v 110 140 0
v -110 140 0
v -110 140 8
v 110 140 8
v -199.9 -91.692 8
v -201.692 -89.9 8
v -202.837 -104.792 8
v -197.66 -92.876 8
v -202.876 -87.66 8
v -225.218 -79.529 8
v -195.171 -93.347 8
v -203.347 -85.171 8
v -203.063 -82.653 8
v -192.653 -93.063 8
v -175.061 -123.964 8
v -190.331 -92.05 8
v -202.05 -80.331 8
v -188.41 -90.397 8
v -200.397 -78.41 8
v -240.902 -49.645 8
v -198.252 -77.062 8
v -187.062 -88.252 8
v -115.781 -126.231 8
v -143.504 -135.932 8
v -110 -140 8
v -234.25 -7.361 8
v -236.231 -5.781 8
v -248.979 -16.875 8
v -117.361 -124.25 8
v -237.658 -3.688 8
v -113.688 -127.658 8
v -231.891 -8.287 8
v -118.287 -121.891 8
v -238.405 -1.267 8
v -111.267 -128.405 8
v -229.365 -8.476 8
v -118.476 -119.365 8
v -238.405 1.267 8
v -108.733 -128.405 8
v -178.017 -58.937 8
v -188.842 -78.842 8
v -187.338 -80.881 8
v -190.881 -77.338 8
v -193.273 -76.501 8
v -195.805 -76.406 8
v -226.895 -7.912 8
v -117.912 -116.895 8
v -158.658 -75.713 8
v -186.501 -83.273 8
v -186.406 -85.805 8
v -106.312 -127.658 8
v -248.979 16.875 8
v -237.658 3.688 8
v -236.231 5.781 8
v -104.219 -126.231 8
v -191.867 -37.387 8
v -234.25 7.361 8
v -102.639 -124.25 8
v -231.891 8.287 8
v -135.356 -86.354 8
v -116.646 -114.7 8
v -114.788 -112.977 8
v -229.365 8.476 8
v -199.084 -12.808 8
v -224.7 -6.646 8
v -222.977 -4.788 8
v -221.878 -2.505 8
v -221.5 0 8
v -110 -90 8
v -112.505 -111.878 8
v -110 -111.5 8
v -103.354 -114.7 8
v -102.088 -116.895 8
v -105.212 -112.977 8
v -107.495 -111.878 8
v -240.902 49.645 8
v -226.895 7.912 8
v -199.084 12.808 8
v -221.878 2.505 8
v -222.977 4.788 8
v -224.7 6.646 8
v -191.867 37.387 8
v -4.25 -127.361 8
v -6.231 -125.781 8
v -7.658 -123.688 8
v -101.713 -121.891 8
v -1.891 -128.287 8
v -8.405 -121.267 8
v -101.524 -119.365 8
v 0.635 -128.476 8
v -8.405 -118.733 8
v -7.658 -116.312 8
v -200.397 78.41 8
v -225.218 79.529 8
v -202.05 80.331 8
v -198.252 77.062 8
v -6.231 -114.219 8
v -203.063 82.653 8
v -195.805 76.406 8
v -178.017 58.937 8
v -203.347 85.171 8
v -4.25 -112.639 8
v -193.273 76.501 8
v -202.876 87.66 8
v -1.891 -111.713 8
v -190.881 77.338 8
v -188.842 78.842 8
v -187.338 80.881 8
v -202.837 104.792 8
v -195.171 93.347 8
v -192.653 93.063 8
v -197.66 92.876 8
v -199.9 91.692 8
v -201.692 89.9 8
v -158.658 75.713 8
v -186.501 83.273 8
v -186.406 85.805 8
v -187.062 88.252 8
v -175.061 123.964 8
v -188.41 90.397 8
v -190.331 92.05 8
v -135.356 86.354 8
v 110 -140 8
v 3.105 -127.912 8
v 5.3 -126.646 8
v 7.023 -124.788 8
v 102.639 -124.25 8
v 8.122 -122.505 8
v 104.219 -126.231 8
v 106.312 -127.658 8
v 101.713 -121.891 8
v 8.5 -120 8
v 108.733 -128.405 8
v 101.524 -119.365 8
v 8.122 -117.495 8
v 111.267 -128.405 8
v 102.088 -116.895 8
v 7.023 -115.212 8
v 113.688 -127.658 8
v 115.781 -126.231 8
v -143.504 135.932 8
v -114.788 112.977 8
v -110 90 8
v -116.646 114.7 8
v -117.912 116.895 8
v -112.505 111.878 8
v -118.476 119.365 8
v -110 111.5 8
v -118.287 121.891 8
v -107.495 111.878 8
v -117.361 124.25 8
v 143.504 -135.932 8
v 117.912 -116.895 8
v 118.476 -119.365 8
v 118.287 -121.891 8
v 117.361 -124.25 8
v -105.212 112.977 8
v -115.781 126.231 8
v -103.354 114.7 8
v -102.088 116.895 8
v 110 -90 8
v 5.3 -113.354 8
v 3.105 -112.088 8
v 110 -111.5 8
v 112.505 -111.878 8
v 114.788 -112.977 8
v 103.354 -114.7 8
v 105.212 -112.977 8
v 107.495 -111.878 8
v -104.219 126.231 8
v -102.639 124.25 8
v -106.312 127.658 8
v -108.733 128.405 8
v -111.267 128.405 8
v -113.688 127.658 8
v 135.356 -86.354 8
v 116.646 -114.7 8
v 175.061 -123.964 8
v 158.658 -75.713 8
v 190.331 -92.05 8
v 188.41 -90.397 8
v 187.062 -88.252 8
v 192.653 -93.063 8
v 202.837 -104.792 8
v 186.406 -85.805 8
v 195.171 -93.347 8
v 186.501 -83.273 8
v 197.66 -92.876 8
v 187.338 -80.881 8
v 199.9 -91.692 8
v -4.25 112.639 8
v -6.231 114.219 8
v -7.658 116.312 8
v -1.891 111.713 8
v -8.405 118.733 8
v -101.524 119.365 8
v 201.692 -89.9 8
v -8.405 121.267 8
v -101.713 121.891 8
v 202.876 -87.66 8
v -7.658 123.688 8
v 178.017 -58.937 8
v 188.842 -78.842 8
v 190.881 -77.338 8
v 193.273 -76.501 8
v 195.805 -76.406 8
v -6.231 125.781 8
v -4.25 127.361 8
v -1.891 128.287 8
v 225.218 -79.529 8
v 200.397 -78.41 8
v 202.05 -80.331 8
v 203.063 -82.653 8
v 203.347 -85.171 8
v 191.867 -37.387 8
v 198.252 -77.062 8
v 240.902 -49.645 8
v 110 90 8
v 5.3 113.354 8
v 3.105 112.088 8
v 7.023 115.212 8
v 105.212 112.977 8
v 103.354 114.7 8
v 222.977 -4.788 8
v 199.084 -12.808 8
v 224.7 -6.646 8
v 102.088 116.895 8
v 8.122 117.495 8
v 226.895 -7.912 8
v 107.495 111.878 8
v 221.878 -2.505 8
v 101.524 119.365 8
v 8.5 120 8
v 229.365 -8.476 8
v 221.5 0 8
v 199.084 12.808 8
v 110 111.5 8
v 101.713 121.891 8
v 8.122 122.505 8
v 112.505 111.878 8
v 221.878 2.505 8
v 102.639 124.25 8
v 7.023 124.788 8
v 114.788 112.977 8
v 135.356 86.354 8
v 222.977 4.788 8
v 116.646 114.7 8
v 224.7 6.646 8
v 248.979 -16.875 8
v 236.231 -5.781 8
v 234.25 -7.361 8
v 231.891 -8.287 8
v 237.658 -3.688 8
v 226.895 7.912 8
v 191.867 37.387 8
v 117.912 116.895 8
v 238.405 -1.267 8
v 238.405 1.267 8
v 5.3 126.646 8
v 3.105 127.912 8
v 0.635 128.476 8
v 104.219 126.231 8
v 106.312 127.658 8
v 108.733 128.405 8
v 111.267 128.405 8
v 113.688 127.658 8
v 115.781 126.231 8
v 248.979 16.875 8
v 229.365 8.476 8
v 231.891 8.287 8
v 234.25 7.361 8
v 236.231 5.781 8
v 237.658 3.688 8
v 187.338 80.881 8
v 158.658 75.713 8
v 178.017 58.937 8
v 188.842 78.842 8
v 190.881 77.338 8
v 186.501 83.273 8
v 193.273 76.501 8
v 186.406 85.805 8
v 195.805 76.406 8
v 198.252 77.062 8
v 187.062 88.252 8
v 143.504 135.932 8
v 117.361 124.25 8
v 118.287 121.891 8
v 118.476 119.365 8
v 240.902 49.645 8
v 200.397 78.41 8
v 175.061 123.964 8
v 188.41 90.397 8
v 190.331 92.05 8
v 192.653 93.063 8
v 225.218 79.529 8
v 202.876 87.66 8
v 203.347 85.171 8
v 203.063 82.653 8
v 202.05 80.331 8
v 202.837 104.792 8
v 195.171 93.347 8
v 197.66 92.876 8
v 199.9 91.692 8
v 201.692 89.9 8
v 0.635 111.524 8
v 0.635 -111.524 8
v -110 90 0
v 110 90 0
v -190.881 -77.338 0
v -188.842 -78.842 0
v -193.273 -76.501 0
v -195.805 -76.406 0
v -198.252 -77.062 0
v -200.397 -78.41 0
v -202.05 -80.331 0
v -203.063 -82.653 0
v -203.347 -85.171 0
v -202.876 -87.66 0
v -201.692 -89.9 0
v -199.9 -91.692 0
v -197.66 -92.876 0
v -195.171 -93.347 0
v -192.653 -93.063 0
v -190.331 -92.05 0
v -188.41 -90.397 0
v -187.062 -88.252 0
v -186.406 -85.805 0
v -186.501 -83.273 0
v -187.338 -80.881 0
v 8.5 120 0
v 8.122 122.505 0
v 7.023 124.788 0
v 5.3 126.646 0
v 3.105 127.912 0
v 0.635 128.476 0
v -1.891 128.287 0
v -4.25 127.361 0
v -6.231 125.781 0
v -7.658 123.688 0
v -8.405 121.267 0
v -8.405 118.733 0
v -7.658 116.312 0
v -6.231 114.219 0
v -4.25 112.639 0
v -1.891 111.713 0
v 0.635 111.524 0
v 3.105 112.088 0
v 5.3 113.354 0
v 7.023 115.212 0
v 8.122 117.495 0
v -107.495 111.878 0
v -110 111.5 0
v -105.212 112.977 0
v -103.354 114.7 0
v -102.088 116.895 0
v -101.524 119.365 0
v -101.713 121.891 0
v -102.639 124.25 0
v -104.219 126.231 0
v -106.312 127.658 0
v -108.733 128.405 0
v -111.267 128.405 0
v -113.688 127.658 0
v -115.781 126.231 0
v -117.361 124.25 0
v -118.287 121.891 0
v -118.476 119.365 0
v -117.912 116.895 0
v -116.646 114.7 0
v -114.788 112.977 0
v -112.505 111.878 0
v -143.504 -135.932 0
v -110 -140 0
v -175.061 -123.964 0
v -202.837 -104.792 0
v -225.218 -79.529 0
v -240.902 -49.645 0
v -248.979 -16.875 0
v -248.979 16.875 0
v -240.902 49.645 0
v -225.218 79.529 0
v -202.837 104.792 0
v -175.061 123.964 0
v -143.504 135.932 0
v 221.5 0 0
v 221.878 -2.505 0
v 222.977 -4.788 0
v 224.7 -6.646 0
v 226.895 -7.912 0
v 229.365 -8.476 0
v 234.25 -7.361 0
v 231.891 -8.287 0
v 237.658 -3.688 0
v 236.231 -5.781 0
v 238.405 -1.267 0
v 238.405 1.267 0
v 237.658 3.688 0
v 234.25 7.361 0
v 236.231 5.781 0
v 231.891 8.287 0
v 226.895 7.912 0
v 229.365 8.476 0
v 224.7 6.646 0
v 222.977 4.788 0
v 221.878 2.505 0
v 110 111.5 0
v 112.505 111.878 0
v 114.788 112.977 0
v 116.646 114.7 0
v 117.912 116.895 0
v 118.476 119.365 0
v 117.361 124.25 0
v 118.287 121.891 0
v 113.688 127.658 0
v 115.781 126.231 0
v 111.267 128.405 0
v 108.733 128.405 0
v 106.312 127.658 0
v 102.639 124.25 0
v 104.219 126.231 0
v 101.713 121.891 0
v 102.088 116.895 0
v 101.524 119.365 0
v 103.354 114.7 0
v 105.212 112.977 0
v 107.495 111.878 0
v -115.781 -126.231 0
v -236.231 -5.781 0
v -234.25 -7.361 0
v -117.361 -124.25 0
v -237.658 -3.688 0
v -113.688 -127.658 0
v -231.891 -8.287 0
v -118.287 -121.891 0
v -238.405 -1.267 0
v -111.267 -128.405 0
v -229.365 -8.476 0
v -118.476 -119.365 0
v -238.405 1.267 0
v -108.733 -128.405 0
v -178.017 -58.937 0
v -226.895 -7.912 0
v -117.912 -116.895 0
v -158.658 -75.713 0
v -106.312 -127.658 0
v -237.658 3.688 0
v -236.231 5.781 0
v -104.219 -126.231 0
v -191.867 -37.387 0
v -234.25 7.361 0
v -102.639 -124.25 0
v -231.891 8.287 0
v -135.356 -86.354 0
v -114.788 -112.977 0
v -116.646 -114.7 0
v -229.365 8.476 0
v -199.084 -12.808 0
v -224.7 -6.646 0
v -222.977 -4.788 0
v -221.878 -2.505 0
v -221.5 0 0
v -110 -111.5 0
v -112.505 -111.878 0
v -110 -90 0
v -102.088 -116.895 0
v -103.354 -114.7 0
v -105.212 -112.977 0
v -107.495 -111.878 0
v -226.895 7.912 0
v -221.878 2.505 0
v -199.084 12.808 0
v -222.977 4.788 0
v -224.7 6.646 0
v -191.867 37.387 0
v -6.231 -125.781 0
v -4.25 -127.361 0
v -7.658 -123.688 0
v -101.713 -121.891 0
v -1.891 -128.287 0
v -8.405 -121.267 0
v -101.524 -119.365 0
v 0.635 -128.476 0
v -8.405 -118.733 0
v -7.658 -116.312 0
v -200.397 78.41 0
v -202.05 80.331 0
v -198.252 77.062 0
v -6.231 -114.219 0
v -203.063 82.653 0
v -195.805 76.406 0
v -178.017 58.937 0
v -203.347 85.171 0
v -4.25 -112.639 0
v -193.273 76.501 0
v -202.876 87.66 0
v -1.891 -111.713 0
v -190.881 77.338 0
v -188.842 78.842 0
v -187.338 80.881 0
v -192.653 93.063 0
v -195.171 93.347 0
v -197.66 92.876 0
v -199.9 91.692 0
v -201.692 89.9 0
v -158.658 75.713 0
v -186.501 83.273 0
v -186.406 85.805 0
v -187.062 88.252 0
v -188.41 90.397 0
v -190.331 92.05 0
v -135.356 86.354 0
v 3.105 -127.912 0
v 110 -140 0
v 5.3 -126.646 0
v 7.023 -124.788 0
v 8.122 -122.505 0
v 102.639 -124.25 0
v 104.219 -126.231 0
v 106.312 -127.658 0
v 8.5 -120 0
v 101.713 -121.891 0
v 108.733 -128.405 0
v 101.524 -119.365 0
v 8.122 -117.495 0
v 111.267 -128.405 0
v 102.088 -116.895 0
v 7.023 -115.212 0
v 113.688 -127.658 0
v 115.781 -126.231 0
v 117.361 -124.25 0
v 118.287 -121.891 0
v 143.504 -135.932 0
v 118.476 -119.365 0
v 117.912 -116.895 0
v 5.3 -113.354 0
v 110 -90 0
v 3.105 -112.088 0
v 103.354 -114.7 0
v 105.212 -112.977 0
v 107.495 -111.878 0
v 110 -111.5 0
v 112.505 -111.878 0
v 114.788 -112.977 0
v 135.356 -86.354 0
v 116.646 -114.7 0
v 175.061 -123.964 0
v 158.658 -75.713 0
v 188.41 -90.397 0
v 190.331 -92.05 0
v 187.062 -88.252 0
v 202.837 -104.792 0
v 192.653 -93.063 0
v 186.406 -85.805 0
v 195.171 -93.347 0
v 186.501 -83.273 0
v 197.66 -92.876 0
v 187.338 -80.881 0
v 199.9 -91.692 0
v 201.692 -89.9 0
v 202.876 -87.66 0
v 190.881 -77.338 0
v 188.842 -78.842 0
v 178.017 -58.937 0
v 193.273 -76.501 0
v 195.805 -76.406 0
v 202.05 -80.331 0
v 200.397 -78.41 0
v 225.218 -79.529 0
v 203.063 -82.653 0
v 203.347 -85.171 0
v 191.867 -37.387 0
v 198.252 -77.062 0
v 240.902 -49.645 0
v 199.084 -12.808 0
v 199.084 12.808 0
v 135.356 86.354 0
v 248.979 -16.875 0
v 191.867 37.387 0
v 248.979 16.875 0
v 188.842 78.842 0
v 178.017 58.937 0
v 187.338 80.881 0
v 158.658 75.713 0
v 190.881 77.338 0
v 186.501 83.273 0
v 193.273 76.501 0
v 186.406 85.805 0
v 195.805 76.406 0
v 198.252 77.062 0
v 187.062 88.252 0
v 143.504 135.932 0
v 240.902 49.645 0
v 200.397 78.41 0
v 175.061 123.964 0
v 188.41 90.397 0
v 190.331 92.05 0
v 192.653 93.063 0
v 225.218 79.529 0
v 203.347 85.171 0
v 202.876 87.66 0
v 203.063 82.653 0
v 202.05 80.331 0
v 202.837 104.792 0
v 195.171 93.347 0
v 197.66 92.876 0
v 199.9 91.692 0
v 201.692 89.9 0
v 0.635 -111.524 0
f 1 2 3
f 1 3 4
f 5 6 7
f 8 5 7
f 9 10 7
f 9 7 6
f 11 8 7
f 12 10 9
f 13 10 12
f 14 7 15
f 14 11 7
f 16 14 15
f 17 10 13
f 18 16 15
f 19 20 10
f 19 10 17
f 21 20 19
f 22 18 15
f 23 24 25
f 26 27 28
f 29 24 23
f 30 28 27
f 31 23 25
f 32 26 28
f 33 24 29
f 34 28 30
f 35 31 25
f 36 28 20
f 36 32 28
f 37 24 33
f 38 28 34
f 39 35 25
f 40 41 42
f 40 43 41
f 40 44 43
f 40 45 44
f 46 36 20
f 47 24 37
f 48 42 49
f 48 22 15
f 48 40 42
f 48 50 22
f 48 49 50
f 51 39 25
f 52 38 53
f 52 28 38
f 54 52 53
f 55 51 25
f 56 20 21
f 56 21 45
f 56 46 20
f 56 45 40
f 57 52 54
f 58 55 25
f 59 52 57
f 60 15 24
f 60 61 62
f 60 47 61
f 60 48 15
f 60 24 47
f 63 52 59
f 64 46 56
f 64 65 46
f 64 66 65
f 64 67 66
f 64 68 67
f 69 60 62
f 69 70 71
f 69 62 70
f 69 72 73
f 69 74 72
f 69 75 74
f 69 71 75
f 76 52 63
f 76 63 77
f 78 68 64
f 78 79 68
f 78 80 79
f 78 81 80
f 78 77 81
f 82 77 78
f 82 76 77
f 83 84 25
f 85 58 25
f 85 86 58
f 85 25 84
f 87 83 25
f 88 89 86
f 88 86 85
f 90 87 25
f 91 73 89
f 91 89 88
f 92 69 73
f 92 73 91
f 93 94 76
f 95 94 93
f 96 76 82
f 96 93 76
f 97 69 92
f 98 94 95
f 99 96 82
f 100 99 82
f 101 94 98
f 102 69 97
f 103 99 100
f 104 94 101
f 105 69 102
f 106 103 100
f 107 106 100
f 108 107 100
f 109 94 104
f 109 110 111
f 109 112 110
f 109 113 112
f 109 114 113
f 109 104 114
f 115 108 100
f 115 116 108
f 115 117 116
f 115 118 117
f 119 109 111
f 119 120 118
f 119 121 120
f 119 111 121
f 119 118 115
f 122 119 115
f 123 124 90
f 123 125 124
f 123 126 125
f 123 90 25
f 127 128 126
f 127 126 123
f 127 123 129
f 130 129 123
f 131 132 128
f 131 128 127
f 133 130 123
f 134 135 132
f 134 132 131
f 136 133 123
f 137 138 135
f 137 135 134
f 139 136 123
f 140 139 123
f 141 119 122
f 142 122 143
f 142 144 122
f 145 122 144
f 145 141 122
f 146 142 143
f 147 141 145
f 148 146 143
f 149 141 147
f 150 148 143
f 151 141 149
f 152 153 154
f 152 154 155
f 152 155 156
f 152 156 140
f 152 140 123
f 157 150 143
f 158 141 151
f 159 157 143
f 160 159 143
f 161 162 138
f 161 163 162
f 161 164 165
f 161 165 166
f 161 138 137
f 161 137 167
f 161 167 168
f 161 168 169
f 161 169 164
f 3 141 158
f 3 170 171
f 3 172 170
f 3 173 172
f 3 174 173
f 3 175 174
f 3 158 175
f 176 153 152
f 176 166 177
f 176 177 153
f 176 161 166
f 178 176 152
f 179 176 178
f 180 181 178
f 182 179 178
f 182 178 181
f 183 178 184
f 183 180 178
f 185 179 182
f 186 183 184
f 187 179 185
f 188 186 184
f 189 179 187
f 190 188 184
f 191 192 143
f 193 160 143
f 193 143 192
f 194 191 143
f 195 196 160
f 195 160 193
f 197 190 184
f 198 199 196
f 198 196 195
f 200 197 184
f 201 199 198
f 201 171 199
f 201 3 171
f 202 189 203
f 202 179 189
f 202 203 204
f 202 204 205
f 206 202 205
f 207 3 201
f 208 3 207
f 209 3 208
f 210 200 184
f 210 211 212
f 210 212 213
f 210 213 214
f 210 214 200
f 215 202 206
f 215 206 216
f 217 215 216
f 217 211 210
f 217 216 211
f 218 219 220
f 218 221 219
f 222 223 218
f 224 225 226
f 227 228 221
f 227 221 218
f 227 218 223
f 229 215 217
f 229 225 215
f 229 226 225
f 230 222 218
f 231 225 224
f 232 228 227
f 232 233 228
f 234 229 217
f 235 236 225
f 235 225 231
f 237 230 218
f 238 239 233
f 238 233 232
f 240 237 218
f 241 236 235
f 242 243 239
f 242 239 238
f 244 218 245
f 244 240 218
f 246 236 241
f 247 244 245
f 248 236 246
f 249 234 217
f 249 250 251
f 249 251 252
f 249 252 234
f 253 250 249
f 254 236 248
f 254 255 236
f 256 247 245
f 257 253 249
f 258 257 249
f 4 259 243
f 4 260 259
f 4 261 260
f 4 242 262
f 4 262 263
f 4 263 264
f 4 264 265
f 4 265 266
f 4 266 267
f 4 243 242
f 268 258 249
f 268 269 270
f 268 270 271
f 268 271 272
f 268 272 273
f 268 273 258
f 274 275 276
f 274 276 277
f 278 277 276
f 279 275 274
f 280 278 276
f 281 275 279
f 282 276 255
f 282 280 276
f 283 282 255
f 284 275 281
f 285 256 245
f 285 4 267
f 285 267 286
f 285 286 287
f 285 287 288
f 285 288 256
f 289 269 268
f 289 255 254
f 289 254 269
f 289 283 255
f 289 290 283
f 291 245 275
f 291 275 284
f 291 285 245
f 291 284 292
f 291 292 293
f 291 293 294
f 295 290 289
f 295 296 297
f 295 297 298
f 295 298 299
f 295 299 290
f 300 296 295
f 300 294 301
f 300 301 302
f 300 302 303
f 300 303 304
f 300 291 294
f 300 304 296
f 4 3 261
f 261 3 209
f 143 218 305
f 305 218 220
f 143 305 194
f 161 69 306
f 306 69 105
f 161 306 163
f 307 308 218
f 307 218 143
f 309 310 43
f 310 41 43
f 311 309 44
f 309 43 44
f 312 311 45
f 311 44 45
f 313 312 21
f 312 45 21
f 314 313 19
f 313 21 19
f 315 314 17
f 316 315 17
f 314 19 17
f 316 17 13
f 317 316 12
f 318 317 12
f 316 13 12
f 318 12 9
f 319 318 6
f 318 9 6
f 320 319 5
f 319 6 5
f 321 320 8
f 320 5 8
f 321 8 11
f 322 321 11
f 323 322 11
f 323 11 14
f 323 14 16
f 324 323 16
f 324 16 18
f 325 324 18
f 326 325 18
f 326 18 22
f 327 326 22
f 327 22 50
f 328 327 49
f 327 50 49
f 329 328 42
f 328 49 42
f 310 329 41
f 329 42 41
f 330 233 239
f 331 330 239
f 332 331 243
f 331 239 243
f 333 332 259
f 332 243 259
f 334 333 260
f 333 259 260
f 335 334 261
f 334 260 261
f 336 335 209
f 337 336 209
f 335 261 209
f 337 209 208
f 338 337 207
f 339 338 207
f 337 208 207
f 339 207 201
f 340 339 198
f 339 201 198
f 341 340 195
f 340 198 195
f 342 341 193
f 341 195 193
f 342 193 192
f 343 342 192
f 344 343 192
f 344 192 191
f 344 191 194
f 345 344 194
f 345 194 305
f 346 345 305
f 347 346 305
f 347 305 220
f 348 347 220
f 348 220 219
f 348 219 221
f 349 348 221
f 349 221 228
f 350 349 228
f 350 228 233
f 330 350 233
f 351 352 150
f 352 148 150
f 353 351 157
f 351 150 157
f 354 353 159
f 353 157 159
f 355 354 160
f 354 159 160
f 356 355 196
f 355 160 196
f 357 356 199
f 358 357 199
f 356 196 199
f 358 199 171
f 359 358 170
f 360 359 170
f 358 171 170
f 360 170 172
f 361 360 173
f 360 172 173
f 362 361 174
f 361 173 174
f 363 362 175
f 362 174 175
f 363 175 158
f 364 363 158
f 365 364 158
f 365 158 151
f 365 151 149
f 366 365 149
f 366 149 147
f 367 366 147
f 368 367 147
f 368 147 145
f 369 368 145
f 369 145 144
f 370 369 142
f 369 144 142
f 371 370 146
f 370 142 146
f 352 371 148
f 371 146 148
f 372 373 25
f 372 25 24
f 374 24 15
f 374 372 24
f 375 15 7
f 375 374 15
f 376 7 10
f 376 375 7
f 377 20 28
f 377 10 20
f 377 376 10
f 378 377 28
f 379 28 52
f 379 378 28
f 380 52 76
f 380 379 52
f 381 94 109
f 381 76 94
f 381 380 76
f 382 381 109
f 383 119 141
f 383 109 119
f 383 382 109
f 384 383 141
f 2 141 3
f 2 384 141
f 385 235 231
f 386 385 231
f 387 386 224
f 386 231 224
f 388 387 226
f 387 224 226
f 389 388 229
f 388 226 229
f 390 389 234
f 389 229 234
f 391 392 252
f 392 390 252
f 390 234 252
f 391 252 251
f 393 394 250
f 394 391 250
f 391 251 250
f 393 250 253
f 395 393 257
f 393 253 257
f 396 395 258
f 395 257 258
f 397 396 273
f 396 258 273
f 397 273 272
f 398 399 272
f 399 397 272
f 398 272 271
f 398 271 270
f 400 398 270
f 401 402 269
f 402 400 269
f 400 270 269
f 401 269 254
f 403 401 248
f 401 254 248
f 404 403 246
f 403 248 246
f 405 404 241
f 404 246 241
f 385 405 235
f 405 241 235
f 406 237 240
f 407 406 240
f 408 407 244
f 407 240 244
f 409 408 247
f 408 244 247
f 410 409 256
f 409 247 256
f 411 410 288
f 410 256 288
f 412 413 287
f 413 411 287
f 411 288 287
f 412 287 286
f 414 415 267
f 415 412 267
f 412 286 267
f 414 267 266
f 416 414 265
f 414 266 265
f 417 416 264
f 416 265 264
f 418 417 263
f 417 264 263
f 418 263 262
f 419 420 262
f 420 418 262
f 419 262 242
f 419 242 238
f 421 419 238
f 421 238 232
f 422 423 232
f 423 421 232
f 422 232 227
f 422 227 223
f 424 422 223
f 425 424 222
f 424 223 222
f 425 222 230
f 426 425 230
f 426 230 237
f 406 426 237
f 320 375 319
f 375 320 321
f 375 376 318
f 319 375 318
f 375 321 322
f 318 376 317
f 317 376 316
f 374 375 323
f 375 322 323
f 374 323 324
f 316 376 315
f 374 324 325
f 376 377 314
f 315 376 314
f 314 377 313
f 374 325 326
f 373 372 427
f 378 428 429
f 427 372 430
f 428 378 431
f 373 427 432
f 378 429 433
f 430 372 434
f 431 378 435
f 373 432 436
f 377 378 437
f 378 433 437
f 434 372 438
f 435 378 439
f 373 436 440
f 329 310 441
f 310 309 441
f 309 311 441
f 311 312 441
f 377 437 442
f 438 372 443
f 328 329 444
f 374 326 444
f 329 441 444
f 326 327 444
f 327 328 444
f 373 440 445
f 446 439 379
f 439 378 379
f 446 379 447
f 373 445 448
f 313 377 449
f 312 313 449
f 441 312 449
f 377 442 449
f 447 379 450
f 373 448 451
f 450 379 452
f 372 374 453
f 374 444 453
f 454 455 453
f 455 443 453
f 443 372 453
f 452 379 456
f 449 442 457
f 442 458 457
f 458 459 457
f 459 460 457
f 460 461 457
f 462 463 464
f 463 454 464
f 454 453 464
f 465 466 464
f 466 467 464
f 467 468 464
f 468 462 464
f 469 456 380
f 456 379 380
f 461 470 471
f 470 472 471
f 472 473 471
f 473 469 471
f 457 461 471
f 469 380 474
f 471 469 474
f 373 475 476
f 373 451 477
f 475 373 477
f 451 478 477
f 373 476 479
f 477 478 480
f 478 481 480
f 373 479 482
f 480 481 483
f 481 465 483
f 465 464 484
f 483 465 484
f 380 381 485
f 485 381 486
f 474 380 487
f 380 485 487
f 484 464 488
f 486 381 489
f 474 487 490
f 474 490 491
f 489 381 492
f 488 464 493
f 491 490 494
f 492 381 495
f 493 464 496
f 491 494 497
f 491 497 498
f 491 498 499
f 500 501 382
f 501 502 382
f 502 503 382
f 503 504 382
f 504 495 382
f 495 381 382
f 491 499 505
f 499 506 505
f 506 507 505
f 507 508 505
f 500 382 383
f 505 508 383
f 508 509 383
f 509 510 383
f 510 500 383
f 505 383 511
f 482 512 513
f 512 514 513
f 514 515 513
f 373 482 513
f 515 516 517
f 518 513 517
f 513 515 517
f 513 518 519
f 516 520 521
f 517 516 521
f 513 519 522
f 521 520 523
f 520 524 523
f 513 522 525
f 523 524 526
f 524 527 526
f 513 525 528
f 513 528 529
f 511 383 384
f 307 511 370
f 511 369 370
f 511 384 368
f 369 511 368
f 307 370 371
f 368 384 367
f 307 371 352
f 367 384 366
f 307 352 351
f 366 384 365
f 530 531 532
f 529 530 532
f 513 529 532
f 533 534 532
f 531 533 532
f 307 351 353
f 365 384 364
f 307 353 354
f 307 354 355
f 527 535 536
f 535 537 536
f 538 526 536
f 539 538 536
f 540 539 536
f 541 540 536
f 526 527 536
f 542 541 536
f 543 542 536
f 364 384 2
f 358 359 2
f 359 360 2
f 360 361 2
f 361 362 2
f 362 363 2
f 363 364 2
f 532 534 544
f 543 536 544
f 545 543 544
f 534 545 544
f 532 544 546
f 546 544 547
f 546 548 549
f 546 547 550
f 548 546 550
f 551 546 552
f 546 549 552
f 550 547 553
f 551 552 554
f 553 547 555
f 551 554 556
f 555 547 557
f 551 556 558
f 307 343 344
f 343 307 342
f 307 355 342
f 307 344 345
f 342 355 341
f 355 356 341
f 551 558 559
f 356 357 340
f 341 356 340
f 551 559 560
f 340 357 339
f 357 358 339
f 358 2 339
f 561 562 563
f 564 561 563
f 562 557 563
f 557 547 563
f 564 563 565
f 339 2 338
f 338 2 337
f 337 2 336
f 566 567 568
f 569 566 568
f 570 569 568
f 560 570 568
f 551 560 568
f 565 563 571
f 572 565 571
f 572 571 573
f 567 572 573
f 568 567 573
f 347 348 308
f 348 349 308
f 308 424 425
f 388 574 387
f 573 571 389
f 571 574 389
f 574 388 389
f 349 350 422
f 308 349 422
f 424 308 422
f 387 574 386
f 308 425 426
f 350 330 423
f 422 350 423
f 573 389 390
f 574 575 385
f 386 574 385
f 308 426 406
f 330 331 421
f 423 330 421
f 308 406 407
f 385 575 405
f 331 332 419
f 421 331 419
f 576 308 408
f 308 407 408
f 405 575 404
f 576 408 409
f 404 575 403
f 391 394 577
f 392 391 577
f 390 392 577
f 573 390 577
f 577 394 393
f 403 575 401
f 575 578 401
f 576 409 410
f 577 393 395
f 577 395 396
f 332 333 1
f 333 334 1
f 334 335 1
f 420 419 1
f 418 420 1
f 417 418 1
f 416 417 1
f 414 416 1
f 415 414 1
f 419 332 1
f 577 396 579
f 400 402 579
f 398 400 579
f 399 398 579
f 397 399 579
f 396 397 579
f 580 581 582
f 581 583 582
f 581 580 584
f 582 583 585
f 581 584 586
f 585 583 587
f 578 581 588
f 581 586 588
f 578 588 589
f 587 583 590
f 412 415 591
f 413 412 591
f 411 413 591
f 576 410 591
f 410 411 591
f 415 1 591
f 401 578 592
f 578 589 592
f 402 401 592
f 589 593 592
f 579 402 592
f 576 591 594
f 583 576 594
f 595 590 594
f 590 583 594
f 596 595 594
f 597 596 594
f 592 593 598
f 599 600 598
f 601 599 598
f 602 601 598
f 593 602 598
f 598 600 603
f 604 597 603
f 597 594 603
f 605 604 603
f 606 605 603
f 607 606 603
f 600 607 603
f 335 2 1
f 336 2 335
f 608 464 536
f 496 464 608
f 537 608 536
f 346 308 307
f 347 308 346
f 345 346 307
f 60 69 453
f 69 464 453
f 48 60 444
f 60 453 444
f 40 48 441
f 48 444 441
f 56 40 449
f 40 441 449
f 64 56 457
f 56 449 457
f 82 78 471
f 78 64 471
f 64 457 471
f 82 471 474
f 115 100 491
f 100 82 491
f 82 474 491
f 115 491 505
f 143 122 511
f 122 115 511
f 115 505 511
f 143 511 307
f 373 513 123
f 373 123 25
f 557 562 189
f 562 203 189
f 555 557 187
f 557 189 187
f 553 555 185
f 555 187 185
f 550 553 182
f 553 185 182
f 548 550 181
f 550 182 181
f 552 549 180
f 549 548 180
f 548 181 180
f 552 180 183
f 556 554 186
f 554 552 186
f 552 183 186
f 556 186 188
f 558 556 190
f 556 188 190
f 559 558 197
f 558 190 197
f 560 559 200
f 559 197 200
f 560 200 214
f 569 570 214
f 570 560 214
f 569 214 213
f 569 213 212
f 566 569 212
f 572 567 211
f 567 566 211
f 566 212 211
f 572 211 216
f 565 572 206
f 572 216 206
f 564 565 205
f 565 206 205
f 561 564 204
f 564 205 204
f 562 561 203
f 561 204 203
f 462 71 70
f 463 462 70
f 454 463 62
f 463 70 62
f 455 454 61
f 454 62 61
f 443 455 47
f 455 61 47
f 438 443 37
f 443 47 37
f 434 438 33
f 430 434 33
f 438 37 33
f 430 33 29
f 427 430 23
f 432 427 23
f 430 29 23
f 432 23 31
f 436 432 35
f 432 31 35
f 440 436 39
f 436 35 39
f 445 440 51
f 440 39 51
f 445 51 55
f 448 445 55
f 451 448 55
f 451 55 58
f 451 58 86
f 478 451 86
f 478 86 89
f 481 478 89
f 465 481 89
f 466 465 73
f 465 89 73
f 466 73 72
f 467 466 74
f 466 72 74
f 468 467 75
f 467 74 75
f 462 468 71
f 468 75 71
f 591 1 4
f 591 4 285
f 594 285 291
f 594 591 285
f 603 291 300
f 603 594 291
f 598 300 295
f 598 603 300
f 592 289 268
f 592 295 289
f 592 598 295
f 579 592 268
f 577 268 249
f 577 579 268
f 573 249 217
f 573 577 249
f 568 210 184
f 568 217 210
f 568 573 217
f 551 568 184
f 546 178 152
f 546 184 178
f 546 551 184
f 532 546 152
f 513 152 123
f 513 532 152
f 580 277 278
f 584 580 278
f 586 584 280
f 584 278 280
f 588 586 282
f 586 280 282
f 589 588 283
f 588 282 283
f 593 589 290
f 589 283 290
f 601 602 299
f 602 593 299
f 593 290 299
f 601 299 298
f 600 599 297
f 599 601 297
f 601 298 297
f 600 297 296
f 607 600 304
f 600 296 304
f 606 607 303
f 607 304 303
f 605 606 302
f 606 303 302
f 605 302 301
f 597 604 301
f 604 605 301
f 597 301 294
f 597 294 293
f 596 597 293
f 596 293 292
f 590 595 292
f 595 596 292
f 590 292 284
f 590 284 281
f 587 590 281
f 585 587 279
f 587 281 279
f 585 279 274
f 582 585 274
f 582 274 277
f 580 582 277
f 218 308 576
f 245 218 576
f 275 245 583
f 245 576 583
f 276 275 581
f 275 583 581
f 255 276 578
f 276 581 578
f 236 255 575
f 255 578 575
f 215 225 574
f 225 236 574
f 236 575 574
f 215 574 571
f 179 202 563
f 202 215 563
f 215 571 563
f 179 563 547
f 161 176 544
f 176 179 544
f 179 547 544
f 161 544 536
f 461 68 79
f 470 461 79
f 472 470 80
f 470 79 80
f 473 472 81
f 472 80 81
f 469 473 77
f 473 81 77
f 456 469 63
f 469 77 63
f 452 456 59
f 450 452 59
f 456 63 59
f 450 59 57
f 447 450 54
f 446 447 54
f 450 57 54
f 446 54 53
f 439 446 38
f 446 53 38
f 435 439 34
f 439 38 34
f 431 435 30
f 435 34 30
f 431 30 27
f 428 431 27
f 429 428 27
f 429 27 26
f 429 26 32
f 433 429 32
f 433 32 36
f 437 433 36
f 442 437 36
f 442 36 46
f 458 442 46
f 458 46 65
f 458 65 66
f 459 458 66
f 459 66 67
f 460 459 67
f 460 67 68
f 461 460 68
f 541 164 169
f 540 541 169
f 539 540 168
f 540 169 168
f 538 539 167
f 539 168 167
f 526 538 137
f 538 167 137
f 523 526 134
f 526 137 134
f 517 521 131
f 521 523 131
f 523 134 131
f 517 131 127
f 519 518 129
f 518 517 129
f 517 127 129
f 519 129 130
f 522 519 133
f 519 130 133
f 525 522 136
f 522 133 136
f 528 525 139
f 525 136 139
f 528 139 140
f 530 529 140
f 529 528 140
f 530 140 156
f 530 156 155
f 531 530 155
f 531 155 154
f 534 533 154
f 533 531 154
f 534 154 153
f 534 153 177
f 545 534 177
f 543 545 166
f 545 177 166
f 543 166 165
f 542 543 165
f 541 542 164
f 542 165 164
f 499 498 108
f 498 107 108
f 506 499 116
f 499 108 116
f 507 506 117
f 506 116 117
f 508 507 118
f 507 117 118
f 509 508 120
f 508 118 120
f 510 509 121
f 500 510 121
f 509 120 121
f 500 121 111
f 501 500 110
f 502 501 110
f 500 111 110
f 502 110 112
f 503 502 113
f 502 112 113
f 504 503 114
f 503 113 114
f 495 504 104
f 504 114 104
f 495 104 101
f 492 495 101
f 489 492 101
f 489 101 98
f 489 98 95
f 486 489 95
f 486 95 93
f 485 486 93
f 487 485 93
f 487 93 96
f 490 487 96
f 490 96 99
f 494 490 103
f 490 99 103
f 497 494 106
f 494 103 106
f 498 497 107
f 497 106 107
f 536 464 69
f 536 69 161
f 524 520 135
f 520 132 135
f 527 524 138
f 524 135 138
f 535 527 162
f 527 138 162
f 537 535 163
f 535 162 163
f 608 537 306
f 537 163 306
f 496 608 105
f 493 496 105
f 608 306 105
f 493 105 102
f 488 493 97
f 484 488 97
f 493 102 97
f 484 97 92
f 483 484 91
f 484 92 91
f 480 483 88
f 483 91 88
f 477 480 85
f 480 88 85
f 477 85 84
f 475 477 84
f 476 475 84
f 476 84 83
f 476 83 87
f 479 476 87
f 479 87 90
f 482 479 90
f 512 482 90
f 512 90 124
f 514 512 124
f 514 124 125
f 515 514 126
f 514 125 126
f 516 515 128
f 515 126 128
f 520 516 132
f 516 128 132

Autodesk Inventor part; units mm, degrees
ref_plane "YZ Plane" through (0, 0, 0) normal (1, 0, 0) x (0, 1, 0)
ref_plane "XZ Plane" through (0, 0, 0) normal (0, 1, 0) x (-1, 0, 0)
ref_plane "XY Plane" through (0, 0, 0) normal (0, 0, 1) x (1, 0, 0)
sketch "Sketch2" plane through (0, 0, 0) normal (0, 0, 1) x (1, 0, 0)
  line L0 (-110, 0) -> (110, 0) construction
  line L1 (-110, -90) -> (110, -90)
  line L2 (110, 90) -> (-110, 90)
  arc A0 (-110, 90) -> (-110, -90) centre (-110, 0) ccw
  arc A1 (110, -90) -> (110, 90) centre (110, 0) ccw
  line L3 (-200, 0) -> (200, 0) construction
  line L4 (-110, 140) -> (110, 140)
  arc A2 (110, -140) -> (110, 140) centre (110, 0) ccw
  line L5 (110, -140) -> (-110, -140)
  arc A3 (-110, 140) -> (-110, -140) centre (-110, 0) ccw
  point P0 (0, 0)
  dimension "Charging_hatch_width" = 400
  dimension "d11" = 400
  dimension "d12" = 180
  dimension "d13" = 50
extrude "Plate2" add sketch "Sketch2" along normal blind 8
sketch "Sketch3" plane through (0, 0, 8) normal (0, 0, 1) x (1, 0, 0)
  arc A0 (-110, 140) -> (-110, -140) centre (-110, 0) ccw construction
  line L0 (-110, 140) -> (110, 140) construction
  arc A1 (110, -140) -> (110, 140) centre (110, 0) ccw construction
  line L1 (110, -140) -> (-110, -140) projected
  circle A2 centre (-230, 0) radius 8.5
  arc A3 (-110, 120) -> (-110, -120) centre (-110, 0) ccw construction
  line L2 (-110, 120) -> (110, 120) construction
  arc A4 (110, -120) -> (110, 120) centre (110, 0) ccw construction
  line L3 (110, -120) -> (-110, -120) construction
  point P0 (0, 0)
  dimension "Charging_hatch_width" = 400
  dimension "d15" = 17
  dimension "d16" = 20
extrude "Cut1" cut sketch "Sketch3" against normal blind 8
pattern_circular "Circular Pattern1" count 5 over 180 about axis through (-110, 0, 0) along (0, 0, 1) of "Cut1" both ways yes
mirror "Mirror1" about plane through (0, 0, 0) normal (1, 0, 0) of "Cut1", "Circular Pattern1"
sketch "Sketch4" plane through (0, 0, 8) normal (0, 0, 1) x (1, 0, 0)
  circle A0 centre (-110, 120) radius 8.5 construction
  circle A1 centre (110, 120) radius 8.5 construction
  circle A2 centre (-110, -120) radius 8.5 construction
  circle A3 centre (110, -120) radius 8.5 construction
  circle A4 centre (0, -120) radius 8.5
  circle A5 centre (0, 120) radius 8.5
  point P0 (0, 0)
  dimension "Charging_hatch_width" = 400
  dimension "d22" = 0
extrude "Cut2" cut sketch "Sketch4" against normal blind 8
equation "\"d11\" = Charging_hatch_width"
equation "\"d12\" = Charging_hatch_hight"
equation "\"d17\" = Thickness"
equation "\"d23\" = Thickness"
equation "\"d14\" = Thickness"
equation "\"BendReliefWidth\" = Thickness"
equation "\"BendReliefDepth\" = 0.5 * Thickness"
equation "\"CornerReliefSize\" = 4 * Thickness"
equation "\"MinimumRemnant\" = 2 * Thickness"
equation "\"TransitionRadius\" = BendRadius"
equation "\"JacobiRadiusSize\" = BendRadius"
equation "\"GapSize\" = Thickness"
equation "\"Charging_hatch_hight\" = 180"
equation "\"Thickness\" = 8"
equation "\"BendRadius\" = 6"
properties part number "PNS-631 charging flange" material "Steel"
